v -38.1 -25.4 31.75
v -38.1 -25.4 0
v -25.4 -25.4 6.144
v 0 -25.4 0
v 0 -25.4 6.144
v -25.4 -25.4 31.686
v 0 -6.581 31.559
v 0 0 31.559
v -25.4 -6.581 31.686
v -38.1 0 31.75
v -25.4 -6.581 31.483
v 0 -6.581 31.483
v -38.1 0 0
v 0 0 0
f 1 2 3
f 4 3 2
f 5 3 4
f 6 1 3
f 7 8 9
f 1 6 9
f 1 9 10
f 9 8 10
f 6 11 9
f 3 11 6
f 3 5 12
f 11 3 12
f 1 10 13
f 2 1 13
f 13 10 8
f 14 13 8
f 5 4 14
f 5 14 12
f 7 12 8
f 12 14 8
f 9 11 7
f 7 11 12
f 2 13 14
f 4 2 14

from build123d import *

# Parameters (mm, degrees)
F1_DEPTH  = 25.4
F3_DEPTH  = 25.4
F3_FACE_W = 25.4
F3_FACE_H = 18.81851
F4_DEPTH  = 0.268369


with BuildPart() as f1:
    # F0 (on Front) → F1 (new body)
    with BuildSketch(Plane.XZ):
        Polygon((0, 31.558946), (-38.099521, 31.75), (-38.099521, 0), (0, 0), align=None)
    extrude(amount=F1_DEPTH)

    # F2 (on Right) → F3 (cut)
    with BuildSketch(Plane.YZ):
        Polygon((-25.44473, 6.083318), (-6.581489, 31.482631), (-25.631489, 31.482631), align=None)
    extrude(amount=-F3_DEPTH, mode=Mode.SUBTRACT)

    # F3_face (on face) → F4 (cut, through all)
    with BuildSketch(Plane(origin=(-12.7, -15.990745, 31.482631), x_dir=(1, 0, 0), z_dir=(0, 0, -1))):
        Rectangle(F3_FACE_W, F3_FACE_H)
    extrude(amount=-F4_DEPTH, mode=Mode.SUBTRACT)


solid = f1.part
